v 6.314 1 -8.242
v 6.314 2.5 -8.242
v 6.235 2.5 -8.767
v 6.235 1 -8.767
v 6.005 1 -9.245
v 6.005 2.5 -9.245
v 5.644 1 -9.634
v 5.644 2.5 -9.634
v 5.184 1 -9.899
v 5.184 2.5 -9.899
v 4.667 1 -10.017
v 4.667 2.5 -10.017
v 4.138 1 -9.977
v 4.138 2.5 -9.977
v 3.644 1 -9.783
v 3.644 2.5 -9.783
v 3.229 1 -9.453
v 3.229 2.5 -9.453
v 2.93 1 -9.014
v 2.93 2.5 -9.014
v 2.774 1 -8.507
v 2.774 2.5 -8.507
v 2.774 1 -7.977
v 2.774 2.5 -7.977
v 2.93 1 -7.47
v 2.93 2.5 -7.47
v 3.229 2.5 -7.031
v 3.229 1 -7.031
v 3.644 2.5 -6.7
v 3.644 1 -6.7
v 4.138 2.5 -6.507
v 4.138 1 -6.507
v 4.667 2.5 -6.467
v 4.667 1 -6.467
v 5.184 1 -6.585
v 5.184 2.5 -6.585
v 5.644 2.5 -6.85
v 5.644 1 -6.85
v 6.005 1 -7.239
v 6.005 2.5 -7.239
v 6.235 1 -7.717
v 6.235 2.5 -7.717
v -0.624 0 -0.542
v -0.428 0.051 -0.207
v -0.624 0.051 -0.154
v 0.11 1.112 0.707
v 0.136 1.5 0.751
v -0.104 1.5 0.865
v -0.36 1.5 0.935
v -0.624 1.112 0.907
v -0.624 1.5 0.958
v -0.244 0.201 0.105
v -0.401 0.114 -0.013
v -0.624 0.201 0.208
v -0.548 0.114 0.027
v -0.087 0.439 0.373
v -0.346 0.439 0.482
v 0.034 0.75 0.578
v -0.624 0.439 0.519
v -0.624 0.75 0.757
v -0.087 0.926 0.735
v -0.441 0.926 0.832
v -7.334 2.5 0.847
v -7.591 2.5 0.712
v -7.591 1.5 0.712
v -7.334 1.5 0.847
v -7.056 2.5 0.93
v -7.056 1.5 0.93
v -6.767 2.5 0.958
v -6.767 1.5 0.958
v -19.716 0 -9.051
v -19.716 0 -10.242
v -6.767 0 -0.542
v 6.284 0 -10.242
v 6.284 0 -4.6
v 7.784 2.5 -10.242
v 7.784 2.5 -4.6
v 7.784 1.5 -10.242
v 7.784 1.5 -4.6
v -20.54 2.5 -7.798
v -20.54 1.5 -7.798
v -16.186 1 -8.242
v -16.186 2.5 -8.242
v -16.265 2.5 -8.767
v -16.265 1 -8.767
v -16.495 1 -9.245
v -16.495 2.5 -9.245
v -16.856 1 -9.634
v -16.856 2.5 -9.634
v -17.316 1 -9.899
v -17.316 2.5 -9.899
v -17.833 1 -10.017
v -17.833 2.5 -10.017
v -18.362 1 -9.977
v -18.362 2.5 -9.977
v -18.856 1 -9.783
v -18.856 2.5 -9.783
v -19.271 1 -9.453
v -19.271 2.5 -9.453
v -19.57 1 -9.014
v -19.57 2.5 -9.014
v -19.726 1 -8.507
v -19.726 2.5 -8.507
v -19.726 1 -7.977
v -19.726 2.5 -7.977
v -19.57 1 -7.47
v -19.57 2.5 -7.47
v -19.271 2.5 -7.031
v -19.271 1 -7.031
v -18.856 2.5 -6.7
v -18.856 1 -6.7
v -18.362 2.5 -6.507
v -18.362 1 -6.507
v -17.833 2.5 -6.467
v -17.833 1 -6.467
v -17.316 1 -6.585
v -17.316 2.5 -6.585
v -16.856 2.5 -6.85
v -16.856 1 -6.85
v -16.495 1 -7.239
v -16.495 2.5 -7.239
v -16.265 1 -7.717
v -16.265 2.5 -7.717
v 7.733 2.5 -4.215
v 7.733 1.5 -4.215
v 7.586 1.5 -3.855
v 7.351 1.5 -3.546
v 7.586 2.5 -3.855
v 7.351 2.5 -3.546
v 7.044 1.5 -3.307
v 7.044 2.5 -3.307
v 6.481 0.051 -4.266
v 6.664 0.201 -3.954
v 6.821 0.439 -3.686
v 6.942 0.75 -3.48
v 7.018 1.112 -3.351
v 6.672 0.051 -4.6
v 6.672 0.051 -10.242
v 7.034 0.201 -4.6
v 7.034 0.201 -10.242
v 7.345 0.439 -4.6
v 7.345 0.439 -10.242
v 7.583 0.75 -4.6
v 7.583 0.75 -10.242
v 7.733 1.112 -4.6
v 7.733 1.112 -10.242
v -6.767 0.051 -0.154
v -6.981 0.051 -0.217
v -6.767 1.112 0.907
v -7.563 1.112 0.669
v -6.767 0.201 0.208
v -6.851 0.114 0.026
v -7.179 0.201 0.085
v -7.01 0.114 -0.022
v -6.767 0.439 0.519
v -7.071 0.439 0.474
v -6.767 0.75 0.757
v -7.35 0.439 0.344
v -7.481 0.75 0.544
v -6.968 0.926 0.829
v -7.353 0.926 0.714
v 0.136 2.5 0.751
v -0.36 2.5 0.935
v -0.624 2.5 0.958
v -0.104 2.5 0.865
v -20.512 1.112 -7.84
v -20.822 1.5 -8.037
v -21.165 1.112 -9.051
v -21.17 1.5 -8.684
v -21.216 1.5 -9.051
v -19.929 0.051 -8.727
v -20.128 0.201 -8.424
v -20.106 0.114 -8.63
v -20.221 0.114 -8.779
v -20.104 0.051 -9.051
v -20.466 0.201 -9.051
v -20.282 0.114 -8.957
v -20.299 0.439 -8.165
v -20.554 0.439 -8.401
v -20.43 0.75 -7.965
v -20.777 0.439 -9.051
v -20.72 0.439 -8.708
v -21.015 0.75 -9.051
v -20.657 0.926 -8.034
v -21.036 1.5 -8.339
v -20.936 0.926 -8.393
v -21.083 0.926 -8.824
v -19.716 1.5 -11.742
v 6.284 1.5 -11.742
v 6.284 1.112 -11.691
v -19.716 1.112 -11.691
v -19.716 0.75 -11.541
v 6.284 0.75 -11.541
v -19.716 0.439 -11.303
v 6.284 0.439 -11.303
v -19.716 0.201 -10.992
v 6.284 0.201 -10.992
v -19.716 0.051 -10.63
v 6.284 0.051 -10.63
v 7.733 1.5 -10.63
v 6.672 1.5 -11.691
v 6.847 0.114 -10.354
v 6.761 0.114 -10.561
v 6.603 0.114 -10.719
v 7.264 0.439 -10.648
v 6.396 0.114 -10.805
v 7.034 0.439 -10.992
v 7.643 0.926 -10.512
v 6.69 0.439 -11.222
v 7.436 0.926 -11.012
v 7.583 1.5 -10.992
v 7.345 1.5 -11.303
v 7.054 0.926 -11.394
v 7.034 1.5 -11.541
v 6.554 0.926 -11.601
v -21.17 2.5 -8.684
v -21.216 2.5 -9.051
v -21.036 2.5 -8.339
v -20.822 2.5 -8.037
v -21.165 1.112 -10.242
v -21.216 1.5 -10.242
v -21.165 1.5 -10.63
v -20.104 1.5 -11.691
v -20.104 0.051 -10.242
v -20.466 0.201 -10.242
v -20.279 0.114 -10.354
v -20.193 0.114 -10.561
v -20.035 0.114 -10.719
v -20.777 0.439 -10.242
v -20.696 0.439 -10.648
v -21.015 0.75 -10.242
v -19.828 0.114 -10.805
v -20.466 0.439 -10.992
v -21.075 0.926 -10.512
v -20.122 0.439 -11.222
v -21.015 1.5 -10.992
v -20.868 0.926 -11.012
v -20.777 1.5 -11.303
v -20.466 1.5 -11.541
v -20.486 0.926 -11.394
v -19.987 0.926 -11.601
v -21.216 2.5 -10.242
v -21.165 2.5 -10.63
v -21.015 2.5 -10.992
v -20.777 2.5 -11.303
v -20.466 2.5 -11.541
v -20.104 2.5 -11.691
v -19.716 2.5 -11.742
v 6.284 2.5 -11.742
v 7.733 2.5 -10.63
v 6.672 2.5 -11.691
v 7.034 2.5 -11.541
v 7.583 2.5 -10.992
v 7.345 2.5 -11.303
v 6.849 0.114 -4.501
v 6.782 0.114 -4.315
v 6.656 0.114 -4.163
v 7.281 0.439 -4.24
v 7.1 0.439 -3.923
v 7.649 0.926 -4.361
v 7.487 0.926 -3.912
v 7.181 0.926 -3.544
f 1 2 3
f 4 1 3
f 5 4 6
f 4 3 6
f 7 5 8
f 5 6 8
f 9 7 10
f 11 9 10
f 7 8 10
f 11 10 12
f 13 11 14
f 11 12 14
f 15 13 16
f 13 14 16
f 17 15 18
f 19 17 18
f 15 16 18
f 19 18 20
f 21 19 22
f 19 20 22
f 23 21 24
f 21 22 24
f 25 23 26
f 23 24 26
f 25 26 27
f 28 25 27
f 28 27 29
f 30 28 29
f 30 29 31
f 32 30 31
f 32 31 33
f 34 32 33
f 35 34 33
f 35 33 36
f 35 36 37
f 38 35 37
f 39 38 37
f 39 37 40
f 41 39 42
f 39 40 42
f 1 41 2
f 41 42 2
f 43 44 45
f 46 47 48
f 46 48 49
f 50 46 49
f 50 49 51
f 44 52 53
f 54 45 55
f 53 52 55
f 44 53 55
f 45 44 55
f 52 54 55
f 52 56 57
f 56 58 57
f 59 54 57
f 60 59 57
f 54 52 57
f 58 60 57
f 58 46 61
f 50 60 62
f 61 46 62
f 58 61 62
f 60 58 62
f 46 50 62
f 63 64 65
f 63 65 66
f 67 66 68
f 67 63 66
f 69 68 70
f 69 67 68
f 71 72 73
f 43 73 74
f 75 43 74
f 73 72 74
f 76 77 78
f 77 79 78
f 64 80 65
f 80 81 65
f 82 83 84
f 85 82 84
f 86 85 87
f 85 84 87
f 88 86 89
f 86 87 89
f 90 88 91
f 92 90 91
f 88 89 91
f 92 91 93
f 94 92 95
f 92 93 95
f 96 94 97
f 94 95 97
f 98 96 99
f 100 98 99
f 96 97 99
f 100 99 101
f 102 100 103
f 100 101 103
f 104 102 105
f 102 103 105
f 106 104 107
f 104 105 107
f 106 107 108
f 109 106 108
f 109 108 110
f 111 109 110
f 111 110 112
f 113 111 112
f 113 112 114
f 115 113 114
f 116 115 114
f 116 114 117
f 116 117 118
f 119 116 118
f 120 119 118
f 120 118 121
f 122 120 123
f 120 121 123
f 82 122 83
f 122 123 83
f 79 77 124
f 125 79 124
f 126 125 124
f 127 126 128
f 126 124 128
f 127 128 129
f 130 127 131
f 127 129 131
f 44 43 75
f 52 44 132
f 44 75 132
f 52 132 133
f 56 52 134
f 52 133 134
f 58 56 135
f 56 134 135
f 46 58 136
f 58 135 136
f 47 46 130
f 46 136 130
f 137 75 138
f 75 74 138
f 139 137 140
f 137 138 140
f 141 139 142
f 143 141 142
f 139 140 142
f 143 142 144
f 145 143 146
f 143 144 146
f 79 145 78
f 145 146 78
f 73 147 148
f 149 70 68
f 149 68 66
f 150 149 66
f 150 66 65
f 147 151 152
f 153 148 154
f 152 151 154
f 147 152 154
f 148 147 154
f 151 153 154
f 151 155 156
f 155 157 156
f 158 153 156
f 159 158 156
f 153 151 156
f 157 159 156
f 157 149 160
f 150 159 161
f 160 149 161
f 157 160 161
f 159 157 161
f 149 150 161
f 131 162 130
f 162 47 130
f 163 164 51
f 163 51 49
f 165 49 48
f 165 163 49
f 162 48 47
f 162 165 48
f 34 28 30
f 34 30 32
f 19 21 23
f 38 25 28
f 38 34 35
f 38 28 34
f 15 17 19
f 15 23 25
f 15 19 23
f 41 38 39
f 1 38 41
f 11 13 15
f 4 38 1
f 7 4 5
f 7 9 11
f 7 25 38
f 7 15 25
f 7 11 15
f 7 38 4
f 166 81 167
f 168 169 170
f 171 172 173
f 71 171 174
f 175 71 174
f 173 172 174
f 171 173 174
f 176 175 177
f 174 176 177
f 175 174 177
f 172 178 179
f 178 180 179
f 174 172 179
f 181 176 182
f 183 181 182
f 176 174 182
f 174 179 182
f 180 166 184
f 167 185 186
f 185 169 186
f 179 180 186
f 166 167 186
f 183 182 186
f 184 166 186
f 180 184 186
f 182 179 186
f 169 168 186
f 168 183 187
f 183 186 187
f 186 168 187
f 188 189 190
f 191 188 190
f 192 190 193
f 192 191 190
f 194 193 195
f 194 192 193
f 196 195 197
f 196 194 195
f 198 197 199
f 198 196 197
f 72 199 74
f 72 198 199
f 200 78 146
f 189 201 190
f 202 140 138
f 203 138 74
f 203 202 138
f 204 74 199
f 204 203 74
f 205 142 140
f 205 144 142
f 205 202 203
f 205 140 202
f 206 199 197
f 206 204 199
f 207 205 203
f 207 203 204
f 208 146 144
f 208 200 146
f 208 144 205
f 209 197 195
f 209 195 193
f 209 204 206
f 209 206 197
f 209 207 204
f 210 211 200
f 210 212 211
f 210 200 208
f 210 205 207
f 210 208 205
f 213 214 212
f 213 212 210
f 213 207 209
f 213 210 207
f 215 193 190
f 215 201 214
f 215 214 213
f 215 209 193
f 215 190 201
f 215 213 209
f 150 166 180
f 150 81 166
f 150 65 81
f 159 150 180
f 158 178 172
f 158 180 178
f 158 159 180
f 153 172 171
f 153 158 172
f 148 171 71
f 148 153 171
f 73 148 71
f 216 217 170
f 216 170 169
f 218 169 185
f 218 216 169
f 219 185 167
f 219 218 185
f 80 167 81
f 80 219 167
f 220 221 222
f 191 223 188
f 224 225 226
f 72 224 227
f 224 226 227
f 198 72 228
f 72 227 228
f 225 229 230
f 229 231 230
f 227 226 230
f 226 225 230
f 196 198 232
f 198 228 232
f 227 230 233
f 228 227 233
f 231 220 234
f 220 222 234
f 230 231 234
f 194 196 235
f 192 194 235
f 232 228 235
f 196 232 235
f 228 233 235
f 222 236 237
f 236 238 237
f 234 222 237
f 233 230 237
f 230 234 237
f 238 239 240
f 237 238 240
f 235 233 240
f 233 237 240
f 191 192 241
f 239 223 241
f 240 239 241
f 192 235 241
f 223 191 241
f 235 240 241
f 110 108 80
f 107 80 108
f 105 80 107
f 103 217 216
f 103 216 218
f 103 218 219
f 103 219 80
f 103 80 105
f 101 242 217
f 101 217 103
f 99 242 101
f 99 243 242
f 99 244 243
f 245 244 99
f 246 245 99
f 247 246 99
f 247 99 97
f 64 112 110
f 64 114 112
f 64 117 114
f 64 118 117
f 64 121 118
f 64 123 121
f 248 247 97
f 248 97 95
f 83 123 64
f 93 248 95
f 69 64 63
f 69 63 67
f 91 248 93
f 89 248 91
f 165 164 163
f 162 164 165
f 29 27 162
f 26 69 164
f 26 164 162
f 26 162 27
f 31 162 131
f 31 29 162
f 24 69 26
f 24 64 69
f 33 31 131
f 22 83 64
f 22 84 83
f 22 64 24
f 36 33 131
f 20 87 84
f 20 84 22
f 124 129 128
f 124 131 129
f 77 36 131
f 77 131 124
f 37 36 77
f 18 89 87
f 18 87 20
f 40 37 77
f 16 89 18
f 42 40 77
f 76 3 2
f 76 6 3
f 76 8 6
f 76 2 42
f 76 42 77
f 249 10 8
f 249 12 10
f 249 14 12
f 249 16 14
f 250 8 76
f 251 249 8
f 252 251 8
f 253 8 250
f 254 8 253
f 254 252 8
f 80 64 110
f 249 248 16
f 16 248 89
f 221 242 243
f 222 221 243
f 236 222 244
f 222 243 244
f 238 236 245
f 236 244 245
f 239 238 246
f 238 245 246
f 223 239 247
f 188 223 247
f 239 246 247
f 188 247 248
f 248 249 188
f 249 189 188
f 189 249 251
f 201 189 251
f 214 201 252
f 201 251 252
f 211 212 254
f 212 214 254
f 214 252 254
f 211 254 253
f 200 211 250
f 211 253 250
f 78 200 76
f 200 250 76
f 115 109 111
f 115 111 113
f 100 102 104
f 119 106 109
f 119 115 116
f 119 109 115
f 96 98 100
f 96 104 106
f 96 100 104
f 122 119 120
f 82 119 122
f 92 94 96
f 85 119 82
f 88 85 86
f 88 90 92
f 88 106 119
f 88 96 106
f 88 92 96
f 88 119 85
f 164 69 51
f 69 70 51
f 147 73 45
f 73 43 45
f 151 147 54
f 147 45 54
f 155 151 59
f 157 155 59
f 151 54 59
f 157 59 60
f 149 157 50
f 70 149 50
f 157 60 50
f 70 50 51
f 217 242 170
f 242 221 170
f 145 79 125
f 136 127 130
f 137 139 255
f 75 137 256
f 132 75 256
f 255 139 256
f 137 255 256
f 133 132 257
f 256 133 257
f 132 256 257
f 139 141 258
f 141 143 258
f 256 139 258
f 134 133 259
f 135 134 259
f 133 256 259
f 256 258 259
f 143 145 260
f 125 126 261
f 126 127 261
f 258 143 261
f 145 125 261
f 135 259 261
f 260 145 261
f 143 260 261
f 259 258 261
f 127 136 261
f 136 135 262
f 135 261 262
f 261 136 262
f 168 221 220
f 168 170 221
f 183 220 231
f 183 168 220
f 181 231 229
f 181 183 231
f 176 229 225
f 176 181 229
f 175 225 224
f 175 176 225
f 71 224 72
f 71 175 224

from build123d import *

# Parameters (mm, degrees)
BOSS_EXTRUDE1_DEPTH = 2.5
SKETCH4_R           = 1.78
CUT_EXTRUDE1_DEPTH  = 1.5
FILLET1_R           = 1.5


with BuildPart() as part:
    # Sketch2 → Boss-Extrude1 (new body)
    with BuildSketch(Plane(origin=(0, 0, 0), x_dir=(1, 0, 0), z_dir=(0, 1, 0))):
        Polygon((-21.216153836, 11.741903429), (-21.216153836, 8.241903429), (-7.216153836, -0.958096571), (-0.216153836, -0.958096571), (7.783846164, 3.741903429), (7.783846164, 11.741903429), align=None)
    extrude(amount=BOSS_EXTRUDE1_DEPTH)

    # Sketch4 → Cut-Extrude1 (cut)
    with BuildSketch(Plane(origin=(0, 2.5, 0), x_dir=(1, 0, 0), z_dir=(0, 1, 0))):
        with Locations((-17.966153836, 8.241903429)):
            Circle(SKETCH4_R)
        with Locations((4.533846164, 8.241903429)):
            Circle(SKETCH4_R)
    extrude(amount=-CUT_EXTRUDE1_DEPTH, mode=Mode.SUBTRACT)

    # Fillet1
    fillet1_edges = [part.edges().sort_by_distance(p)[0] for p in [
        (7.783846164, 1.25, -11.741903429),
        (7.783846164, 1.25, -3.741903429),
        (-0.216153836, 1.25, 0.958096571),
        (-7.216153836, 1.25, 0.958096571),
        (-21.216153836, 1.25, -8.241903429),
        (-21.216153836, 1.25, -11.741903429),
        (7.783846164, 0, -7.741903429),
        (3.783846164, 0, -1.391903429),
        (-3.716153836, 0, 0.958096571),
        (-14.216153836, 0, -3.641903429),
        (-21.216153836, 0, -9.991903429),
        (-6.716153836, 0, -11.741903429),
    ]]
    fillet(fillet1_edges, radius=FILLET1_R)


solid = part.part
